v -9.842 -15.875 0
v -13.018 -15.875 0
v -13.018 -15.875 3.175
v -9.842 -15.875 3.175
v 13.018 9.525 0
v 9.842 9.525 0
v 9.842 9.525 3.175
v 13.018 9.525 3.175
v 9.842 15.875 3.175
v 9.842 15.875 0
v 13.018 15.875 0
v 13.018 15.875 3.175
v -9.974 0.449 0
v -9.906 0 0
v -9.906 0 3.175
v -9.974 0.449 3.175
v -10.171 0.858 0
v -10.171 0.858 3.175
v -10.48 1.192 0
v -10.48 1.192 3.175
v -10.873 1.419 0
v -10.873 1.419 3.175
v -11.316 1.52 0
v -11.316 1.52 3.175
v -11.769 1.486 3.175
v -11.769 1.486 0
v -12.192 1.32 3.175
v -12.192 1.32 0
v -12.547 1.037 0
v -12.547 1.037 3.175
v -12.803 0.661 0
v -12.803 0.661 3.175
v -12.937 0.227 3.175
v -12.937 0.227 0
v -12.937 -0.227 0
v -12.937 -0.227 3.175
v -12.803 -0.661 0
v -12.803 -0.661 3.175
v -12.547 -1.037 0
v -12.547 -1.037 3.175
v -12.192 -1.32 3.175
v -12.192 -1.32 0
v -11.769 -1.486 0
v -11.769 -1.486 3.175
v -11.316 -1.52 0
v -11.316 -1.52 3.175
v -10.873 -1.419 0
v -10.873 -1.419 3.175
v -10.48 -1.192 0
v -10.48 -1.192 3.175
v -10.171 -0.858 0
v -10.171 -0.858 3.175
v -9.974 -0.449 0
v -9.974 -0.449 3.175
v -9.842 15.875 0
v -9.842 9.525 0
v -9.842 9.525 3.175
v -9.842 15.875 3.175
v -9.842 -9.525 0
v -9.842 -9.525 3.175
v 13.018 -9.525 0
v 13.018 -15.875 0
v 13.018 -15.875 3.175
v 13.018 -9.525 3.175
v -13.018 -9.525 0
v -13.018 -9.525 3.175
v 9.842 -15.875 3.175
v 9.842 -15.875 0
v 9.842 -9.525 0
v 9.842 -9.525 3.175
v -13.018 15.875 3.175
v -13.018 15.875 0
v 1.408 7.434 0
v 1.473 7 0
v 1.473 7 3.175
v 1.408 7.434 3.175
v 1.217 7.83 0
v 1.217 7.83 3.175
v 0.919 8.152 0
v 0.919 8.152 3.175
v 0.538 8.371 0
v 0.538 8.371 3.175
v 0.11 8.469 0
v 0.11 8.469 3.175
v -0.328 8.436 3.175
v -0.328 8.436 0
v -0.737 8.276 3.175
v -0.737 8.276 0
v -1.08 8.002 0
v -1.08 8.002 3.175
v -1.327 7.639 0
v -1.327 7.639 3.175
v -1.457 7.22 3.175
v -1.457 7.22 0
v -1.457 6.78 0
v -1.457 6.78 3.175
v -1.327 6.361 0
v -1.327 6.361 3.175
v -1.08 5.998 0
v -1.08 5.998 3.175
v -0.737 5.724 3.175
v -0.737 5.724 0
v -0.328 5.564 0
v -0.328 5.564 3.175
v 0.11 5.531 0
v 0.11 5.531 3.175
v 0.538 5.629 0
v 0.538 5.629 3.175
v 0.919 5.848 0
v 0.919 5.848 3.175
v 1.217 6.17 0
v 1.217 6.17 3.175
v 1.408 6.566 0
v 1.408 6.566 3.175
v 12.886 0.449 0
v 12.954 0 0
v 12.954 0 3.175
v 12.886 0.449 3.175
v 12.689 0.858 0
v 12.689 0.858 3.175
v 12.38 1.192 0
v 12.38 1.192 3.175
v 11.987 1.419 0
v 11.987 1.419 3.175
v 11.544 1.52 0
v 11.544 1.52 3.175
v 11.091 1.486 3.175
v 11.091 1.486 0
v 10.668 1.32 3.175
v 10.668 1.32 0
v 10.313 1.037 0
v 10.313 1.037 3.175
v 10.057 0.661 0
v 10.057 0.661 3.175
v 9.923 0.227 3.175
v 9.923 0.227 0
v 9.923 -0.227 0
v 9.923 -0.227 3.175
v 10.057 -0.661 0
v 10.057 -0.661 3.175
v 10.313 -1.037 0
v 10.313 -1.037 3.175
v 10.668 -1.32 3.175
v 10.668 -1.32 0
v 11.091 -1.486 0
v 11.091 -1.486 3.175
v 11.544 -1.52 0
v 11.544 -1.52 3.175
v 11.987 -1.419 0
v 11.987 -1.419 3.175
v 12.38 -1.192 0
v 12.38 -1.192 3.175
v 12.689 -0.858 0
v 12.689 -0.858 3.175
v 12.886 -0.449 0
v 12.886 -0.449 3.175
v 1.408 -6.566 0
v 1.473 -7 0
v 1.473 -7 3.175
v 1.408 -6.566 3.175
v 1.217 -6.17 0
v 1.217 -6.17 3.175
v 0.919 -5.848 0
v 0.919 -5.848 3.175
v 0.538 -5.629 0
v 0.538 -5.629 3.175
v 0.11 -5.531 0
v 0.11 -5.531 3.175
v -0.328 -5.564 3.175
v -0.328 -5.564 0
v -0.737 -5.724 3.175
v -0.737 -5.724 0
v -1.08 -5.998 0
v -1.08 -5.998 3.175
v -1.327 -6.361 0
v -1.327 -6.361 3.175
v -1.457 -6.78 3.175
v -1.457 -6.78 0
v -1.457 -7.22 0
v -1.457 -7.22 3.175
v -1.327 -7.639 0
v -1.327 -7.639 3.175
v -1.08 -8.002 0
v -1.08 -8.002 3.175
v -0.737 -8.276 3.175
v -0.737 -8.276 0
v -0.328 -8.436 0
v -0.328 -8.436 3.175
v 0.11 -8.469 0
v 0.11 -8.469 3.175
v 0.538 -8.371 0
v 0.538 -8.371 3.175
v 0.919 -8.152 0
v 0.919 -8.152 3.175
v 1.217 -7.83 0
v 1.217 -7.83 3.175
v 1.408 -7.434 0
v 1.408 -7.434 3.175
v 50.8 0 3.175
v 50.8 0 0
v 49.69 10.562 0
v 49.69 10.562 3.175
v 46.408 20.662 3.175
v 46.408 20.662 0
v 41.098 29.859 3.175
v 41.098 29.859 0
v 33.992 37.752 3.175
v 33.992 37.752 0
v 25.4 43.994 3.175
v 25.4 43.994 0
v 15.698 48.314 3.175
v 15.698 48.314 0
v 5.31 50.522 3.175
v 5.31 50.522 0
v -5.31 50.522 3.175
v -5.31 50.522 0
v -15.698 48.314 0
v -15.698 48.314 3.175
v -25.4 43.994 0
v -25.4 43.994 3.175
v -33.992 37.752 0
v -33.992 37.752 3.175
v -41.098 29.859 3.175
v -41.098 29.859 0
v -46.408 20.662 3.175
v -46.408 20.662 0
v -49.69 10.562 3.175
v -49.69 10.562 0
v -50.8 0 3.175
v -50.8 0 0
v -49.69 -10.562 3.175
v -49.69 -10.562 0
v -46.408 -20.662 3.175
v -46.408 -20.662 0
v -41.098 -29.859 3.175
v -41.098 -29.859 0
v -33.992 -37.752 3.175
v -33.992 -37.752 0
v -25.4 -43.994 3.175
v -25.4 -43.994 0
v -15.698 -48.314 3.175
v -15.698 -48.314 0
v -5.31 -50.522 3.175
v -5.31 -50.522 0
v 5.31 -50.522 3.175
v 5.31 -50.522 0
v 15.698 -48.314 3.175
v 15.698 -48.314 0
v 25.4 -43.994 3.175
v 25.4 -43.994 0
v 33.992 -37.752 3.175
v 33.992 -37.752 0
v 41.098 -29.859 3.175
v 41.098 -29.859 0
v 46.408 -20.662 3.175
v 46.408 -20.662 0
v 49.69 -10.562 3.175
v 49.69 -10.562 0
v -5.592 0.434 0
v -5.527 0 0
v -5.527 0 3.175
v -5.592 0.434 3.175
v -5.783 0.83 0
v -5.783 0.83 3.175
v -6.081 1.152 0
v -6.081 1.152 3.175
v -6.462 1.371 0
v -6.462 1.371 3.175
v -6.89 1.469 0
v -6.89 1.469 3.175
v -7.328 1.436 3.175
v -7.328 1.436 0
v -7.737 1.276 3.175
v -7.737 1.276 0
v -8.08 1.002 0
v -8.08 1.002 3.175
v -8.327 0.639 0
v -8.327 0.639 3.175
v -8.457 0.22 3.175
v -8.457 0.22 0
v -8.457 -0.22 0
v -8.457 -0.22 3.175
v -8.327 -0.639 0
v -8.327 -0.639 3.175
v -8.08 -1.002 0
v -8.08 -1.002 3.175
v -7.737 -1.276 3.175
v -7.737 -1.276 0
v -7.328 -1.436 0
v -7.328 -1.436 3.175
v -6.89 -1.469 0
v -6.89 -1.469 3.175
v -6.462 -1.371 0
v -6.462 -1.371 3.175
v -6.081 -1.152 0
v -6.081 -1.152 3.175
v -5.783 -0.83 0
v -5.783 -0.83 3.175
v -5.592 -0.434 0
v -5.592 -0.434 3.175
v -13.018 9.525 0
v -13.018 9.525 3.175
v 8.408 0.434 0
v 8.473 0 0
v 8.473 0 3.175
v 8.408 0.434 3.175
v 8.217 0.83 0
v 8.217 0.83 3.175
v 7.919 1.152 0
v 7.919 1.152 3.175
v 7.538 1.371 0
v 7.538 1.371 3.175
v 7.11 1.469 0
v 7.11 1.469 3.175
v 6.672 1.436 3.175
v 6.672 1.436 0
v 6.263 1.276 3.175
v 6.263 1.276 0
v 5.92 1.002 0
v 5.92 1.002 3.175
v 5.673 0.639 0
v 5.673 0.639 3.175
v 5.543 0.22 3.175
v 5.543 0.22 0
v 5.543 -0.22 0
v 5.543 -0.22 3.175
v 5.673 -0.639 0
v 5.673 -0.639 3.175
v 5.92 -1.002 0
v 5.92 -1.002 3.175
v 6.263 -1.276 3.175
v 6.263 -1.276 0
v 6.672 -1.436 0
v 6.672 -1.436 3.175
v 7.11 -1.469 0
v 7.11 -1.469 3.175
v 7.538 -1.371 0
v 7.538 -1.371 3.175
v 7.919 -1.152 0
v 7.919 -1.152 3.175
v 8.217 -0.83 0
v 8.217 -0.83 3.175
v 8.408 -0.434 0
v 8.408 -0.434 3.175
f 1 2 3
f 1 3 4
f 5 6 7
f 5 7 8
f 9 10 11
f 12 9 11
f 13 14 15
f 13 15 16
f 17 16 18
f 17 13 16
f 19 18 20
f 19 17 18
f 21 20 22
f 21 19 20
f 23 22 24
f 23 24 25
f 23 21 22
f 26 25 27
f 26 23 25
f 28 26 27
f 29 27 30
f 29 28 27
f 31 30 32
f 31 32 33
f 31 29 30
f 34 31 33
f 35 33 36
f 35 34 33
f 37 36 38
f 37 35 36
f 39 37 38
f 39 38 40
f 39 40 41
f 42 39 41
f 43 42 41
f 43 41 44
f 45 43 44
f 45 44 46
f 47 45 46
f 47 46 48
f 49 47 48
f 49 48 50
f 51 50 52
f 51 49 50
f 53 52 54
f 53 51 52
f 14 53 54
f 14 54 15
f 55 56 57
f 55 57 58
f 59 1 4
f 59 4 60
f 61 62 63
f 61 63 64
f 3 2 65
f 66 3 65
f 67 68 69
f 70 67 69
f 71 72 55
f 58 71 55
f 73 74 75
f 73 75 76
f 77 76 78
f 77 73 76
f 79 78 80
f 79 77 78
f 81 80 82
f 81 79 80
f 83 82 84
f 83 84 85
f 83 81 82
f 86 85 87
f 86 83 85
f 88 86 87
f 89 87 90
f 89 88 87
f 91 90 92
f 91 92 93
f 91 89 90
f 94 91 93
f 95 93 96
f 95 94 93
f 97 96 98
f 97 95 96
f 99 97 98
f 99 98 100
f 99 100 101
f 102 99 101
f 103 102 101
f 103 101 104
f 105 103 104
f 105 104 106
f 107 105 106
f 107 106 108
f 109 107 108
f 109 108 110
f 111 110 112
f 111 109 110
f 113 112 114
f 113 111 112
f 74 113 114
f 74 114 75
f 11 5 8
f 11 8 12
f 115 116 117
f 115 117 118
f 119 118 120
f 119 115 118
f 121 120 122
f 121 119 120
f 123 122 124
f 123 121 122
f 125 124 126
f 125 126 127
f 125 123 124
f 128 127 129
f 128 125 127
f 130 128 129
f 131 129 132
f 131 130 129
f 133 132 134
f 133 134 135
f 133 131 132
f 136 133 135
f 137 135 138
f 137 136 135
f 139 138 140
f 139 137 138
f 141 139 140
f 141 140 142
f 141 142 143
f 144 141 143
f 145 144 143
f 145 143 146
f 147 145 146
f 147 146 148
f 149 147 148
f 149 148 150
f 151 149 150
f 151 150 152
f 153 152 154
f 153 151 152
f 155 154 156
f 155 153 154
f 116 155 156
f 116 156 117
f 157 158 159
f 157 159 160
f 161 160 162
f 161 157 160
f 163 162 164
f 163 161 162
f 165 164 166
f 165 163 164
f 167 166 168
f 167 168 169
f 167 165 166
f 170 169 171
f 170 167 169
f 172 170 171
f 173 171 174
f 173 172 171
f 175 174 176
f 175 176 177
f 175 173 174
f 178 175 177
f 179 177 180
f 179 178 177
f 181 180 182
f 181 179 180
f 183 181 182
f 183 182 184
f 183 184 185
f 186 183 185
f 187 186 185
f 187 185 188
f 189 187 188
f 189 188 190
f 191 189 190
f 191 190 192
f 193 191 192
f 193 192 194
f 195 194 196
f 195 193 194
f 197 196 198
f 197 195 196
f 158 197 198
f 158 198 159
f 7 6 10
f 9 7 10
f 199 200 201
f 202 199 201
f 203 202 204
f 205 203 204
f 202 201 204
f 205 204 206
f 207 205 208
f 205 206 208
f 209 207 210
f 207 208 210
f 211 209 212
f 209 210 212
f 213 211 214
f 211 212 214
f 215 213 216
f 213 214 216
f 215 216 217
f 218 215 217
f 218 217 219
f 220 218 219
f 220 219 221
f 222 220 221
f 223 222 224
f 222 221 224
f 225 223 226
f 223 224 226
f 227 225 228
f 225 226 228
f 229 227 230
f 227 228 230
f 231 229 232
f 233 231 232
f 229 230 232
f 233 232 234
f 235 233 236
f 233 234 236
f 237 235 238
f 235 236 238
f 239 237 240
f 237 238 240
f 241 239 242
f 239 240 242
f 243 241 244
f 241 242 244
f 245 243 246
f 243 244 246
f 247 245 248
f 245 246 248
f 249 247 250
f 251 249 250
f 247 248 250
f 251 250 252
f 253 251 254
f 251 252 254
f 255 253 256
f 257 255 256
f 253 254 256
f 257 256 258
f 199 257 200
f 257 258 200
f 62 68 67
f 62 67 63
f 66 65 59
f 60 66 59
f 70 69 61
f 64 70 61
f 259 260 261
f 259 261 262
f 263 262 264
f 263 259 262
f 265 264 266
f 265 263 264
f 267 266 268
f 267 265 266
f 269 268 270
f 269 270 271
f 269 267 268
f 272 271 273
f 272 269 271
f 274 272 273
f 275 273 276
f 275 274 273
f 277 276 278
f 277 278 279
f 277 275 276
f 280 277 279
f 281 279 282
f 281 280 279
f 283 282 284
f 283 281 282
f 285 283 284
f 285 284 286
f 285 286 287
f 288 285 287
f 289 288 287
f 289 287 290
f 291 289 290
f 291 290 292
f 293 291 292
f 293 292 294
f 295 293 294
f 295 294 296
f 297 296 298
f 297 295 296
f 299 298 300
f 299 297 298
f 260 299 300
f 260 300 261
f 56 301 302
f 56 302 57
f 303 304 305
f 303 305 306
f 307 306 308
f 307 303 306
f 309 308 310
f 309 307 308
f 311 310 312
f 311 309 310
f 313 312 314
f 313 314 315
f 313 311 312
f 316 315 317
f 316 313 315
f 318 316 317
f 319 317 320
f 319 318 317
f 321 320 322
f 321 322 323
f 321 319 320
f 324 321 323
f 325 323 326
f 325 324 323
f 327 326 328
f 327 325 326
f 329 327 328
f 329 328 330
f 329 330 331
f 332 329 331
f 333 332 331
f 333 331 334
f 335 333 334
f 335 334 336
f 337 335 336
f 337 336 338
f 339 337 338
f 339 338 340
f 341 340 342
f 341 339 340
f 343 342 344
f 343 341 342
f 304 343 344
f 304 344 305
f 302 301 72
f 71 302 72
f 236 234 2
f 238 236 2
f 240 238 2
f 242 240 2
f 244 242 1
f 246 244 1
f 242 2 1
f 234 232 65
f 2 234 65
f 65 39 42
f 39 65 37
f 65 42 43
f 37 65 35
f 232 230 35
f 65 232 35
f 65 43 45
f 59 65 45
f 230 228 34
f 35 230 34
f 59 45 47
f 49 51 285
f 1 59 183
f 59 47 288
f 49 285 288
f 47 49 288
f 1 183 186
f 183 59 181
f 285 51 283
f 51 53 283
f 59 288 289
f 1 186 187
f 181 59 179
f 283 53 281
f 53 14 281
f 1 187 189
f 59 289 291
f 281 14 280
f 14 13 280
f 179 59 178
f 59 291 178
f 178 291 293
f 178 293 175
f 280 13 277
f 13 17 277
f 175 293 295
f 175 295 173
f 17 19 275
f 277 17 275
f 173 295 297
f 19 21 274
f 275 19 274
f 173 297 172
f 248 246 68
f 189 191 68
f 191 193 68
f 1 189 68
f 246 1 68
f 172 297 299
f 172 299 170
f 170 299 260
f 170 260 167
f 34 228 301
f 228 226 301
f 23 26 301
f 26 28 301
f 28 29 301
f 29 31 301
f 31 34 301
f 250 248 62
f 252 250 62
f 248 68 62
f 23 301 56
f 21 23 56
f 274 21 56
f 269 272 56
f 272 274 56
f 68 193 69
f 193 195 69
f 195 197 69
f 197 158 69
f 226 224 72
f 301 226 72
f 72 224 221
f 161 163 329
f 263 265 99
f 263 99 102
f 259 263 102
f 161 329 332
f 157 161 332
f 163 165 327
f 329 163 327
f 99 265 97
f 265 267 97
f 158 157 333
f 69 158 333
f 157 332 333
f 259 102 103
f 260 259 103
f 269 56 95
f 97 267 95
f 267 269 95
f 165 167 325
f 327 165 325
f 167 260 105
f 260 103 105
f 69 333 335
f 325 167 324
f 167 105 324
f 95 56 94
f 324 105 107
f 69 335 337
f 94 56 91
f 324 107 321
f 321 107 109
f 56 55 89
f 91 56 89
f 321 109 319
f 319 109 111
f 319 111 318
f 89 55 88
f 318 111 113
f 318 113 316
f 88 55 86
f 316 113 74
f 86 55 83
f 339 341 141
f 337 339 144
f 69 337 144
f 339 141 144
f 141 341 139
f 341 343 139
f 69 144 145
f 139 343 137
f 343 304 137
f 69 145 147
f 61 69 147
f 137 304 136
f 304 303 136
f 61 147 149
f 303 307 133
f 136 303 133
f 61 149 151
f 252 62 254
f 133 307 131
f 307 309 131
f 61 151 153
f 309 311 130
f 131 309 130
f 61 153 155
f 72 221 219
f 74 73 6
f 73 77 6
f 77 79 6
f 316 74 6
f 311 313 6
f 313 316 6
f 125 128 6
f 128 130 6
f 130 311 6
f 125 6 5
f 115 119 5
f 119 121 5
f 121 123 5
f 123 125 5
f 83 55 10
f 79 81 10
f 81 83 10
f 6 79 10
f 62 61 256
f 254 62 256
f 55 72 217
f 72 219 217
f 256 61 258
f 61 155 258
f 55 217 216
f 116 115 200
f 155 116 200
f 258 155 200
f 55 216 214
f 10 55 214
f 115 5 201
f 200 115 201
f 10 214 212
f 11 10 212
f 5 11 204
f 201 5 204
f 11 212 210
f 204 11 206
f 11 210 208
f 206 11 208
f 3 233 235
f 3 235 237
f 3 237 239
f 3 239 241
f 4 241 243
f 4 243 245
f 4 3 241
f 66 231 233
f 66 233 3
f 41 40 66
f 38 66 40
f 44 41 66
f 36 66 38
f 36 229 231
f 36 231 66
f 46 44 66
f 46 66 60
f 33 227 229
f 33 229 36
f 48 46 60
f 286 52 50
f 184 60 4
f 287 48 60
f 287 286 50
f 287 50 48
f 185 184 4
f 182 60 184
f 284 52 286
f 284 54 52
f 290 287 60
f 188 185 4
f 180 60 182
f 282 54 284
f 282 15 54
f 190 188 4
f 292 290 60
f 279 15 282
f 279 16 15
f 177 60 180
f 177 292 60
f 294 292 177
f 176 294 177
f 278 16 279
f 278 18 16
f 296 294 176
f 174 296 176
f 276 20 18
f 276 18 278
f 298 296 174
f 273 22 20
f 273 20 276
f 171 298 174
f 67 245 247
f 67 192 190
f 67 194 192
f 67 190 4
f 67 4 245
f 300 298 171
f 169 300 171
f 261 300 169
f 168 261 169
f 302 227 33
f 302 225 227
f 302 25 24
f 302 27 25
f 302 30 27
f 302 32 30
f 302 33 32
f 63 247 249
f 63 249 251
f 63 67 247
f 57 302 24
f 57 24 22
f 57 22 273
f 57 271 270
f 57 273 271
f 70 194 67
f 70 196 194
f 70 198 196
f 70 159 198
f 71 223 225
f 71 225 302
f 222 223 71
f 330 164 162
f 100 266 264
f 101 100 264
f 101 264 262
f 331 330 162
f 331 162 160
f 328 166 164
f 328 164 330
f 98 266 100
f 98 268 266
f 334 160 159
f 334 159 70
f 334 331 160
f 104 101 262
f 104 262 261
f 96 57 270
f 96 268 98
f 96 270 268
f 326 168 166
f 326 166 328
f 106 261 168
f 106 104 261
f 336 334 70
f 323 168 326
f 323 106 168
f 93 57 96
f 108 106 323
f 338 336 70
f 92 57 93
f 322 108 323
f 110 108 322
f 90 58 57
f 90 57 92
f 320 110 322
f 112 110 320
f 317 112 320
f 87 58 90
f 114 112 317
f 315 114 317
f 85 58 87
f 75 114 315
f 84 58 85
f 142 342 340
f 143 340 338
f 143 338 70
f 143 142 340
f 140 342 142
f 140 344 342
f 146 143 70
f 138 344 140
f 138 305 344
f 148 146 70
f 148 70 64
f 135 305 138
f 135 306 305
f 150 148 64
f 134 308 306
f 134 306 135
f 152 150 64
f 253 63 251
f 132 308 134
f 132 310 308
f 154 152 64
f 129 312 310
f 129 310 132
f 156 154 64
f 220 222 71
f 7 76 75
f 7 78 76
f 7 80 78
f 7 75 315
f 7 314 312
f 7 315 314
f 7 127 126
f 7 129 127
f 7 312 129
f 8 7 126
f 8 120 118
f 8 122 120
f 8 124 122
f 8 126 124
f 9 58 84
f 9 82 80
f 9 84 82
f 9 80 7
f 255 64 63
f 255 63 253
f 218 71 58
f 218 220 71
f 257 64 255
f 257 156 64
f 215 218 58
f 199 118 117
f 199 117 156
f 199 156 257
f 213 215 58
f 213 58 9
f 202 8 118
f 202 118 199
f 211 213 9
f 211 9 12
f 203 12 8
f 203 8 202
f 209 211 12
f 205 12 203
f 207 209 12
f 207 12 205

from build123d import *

# Parameters (mm, degrees)
F0_R     = 50.8
F0_W     = 3.175
F0_H     = 6.35
F0_R_2   = 1.4732
F0_R_3   = 1.524
F1_DEPTH = 3.175


# Not quite as in the source:
# - a length typed as a fraction of an inch, garbled in the dataset ("3 / 203.2 mm" for 3/8 in), is restored


with BuildPart() as f1:
    # F0 (on Top) → F1 (new body)
    with BuildSketch(Plane.XY):
        Circle(F0_R)
        with Locations((-11.43, -12.7)):
            Rectangle(F0_W, F0_H, mode=Mode.SUBTRACT)
        with Locations((0, -7)):
            Circle(F0_R_2, mode=Mode.SUBTRACT)
        with Locations((-11.43, 0)):
            Circle(F0_R_3, mode=Mode.SUBTRACT)
        with Locations((-7, 0)):
            Circle(F0_R_2, mode=Mode.SUBTRACT)
        with Locations((11.43, -12.7)):
            Rectangle(F0_W, F0_H, mode=Mode.SUBTRACT)
        with Locations((7, 0)):
            Circle(F0_R_2, mode=Mode.SUBTRACT)
        with Locations((11.43, 0)):
            Circle(F0_R_3, mode=Mode.SUBTRACT)
        with Locations((0, 7)):
            Circle(F0_R_2, mode=Mode.SUBTRACT)
        with Locations((-11.43, 12.7)):
            Rectangle(F0_W, F0_H, mode=Mode.SUBTRACT)
        with Locations((11.43, 12.7)):
            Rectangle(F0_W, F0_H, mode=Mode.SUBTRACT)
    extrude(amount=F1_DEPTH)


solid = f1.part
